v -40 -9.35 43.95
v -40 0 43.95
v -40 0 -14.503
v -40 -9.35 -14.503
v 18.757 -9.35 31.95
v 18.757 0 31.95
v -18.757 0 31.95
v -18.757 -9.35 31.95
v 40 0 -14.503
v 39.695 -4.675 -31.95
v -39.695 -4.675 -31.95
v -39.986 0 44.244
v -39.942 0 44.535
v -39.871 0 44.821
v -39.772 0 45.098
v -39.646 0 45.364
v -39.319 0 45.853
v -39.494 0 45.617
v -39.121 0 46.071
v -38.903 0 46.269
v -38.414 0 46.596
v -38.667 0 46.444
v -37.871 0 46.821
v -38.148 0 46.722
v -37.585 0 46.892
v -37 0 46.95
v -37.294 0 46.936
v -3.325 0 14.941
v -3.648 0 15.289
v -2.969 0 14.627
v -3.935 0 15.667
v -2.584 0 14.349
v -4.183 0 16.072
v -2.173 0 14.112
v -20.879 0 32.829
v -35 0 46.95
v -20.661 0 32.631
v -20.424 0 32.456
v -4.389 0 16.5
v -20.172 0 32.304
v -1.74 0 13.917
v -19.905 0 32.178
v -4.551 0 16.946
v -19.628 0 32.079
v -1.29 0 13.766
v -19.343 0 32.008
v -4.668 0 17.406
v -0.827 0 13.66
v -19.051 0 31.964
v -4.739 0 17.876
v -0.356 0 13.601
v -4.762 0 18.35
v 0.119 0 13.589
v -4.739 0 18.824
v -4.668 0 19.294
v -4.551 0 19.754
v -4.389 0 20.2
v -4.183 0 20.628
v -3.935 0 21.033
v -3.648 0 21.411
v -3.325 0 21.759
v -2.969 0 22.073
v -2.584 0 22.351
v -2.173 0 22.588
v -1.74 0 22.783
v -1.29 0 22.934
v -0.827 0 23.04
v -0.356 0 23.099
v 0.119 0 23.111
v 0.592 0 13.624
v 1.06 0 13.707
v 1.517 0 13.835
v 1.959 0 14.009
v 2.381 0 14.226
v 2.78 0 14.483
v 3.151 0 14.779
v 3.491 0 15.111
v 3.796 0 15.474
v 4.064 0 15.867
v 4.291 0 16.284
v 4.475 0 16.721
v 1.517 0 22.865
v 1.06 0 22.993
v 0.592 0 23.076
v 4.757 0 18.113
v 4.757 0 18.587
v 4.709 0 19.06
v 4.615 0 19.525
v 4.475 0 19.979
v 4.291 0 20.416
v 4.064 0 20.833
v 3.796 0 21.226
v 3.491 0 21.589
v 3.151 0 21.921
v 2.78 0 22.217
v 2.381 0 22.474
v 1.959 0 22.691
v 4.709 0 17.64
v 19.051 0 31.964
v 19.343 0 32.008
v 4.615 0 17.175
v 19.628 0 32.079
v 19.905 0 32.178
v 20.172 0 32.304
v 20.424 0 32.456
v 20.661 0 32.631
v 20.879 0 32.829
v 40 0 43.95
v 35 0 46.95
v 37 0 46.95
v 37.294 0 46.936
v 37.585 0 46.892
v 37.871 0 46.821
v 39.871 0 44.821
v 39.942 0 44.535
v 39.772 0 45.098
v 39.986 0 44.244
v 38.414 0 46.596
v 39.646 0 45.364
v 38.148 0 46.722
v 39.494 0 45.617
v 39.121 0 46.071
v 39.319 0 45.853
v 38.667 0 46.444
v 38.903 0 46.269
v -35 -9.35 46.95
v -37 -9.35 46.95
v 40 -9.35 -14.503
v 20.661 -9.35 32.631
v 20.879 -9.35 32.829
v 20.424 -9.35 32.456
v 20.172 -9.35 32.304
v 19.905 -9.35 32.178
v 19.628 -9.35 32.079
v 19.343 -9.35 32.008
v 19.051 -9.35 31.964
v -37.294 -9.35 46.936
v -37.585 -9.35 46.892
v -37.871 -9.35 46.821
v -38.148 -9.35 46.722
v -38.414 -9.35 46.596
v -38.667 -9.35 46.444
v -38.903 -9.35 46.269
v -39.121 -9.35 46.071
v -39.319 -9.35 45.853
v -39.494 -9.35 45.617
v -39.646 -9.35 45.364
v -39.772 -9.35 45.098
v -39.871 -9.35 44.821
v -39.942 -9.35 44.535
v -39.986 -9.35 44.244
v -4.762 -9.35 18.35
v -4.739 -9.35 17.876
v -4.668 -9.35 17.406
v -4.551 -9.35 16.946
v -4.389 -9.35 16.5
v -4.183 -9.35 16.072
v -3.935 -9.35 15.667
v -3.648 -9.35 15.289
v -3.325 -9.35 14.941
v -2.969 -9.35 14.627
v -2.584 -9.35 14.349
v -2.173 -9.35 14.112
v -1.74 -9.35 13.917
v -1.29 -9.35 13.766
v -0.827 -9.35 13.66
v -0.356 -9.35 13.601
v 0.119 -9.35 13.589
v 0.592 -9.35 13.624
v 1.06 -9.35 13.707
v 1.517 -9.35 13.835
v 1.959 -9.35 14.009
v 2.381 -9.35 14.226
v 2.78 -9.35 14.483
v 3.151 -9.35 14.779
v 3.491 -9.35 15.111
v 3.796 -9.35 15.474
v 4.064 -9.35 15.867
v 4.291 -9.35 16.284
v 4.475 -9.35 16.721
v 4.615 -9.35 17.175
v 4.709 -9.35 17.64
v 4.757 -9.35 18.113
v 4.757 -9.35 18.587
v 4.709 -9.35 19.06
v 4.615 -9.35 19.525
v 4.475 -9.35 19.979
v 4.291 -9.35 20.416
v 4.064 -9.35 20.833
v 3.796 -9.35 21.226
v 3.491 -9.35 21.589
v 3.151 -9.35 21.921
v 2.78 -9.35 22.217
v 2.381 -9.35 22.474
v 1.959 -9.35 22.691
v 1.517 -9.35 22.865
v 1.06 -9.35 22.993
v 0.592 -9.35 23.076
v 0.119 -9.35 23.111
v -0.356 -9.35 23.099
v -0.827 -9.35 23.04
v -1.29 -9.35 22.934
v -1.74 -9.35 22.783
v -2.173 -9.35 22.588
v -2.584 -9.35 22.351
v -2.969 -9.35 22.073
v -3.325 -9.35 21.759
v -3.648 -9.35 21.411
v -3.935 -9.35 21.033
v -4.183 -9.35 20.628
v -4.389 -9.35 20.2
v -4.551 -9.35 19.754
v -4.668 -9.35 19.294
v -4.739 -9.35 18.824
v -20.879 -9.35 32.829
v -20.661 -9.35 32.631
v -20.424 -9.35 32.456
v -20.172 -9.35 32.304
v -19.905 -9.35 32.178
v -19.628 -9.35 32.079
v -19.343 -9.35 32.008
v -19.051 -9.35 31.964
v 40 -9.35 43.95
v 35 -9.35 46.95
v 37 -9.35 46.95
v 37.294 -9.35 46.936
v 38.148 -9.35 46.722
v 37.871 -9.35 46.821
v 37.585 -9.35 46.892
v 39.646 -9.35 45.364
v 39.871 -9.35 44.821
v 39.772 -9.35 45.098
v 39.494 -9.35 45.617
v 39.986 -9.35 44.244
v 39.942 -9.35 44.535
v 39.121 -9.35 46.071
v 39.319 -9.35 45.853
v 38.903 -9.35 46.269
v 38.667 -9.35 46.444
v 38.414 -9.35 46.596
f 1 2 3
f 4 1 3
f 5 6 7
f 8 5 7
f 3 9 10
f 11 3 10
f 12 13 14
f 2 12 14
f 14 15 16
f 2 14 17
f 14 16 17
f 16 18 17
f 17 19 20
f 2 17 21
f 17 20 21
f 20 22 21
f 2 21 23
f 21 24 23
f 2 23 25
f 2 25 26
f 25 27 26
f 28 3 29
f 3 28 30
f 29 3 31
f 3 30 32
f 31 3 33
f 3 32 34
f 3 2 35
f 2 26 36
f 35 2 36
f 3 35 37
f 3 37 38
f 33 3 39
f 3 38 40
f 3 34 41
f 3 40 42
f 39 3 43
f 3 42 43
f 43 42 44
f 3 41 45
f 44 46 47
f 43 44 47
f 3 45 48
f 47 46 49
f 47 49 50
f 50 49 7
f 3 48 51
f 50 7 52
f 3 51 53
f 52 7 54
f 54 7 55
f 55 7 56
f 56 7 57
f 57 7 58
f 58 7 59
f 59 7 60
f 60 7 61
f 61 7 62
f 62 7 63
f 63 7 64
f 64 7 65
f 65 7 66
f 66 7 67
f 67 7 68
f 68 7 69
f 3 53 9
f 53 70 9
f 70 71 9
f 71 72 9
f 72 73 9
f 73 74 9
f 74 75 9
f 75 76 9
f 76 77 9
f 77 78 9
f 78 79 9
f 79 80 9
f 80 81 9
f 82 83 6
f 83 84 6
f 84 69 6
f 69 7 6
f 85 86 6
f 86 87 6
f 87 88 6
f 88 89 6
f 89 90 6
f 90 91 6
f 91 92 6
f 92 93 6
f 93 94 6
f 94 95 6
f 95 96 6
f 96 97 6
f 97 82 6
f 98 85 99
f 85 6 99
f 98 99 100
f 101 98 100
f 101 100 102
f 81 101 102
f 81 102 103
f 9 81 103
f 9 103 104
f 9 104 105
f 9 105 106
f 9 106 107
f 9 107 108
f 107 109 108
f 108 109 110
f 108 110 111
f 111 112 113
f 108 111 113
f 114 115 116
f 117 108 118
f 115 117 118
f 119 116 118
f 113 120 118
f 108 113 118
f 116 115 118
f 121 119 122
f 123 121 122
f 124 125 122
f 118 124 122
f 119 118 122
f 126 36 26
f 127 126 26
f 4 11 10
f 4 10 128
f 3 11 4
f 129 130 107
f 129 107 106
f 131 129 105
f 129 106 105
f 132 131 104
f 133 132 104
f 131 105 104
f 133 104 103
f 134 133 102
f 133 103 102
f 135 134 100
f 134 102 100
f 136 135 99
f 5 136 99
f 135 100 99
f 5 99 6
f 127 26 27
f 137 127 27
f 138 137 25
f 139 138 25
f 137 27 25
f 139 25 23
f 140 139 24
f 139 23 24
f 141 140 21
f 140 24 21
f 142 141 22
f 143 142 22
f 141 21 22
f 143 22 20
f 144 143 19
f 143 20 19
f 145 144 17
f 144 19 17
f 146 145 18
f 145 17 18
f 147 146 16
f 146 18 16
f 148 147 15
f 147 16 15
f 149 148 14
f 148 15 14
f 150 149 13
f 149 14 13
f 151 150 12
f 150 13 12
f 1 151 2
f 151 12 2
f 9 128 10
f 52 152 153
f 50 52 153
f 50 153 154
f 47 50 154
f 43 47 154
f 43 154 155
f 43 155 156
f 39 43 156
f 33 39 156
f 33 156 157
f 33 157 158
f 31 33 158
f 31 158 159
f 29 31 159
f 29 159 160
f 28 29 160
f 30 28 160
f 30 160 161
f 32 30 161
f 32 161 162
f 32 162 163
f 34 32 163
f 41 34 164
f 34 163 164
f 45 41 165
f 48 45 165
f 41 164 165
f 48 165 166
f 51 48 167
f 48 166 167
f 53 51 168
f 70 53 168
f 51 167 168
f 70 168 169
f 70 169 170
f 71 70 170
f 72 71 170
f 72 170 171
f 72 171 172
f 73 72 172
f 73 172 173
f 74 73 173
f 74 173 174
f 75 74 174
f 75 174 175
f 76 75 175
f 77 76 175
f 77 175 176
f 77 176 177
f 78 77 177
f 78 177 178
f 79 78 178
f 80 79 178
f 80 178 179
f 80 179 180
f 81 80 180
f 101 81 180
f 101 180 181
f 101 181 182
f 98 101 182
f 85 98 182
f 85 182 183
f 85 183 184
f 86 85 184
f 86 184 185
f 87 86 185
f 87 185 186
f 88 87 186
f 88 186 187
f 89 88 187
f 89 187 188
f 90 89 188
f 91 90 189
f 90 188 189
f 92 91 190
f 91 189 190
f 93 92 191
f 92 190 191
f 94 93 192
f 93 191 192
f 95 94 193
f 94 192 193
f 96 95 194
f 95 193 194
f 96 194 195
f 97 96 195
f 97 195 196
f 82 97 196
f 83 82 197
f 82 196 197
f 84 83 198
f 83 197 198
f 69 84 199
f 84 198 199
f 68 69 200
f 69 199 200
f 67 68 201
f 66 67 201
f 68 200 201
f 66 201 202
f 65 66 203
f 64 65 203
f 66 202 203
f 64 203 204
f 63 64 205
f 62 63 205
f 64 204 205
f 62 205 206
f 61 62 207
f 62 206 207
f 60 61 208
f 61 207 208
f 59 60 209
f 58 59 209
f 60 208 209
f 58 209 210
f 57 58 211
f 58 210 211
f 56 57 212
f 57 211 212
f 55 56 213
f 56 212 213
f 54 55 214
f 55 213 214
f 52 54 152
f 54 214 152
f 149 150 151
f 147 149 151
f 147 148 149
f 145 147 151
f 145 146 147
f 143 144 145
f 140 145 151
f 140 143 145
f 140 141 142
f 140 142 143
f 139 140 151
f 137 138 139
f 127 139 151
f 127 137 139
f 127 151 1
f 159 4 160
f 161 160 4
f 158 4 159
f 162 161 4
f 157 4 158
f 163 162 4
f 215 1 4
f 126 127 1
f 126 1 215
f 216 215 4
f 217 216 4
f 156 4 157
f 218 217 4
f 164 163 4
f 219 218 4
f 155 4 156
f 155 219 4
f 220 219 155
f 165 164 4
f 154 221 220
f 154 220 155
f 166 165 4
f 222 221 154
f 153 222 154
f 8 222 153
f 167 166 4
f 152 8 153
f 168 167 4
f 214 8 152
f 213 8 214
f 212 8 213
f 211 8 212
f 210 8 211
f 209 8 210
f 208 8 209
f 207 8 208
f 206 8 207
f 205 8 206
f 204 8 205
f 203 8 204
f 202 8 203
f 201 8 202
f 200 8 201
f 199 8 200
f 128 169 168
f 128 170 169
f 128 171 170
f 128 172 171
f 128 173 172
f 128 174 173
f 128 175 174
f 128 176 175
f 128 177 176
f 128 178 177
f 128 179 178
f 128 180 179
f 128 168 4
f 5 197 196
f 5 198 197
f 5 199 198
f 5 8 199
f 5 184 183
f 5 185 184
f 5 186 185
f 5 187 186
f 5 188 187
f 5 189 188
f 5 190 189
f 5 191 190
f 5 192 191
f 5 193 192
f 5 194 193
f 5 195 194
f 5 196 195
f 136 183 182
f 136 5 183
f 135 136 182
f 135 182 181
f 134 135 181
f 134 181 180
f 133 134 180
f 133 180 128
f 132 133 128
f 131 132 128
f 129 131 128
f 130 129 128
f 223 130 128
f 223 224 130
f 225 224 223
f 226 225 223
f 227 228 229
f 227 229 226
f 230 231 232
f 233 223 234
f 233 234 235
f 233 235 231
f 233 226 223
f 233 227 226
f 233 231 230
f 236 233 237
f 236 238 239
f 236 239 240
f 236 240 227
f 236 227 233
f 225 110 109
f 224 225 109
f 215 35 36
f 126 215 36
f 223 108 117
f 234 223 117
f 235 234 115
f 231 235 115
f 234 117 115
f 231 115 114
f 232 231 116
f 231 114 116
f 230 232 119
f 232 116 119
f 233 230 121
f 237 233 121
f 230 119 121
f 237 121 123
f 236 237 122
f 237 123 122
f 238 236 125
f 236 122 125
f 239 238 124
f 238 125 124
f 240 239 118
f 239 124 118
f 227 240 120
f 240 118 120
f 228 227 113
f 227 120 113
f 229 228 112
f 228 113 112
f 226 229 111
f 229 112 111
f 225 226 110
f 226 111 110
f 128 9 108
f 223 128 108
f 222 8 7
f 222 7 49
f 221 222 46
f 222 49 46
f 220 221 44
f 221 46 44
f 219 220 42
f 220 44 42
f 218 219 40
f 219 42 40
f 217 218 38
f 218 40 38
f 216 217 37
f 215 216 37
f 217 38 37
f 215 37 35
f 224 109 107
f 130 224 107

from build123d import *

# Parameters (mm, degrees)
F1_DEPTH = 9.35
F3_DEPTH = 80.001
F5_DEPTH = 9.351
F6_D     = 9.525


with BuildPart() as f1:
    # F0 (on Front) → F1 (new body)
    with BuildSketch(Plane.XZ):
        with BuildLine():
            Line((-40, -31.95), (40, -31.95))
            Line((40, -31.95), (40, 31.95))
            Line((40, 31.95), (40, 43.95))
            ThreePointArc((40, 43.95), (39.1213203436, 46.0713203436), (37, 46.95))
            Line((37, 46.95), (35, 46.95))
            Line((35, 46.95), (20.8786796564, 32.8286796564))
            ThreePointArc((20.8786796564, 32.8286796564), (19.90540961, 32.1783614025), (18.7573593129, 31.95))
            Line((18.7573593129, 31.95), (-18.7573593129, 31.95))
            ThreePointArc((-18.7573593129, 31.95), (-19.90540961, 32.1783614025), (-20.8786796564, 32.8286796564))
            Line((-20.8786796564, 32.8286796564), (-35, 46.95))
            Line((-35, 46.95), (-37, 46.95))
            ThreePointArc((-37, 46.95), (-39.1213203436, 46.0713203436), (-40, 43.95))
            Line((-40, 43.95), (-40, 31.95))
            Line((-40, 31.95), (-40, -31.95))
        make_face()
    extrude(amount=F1_DEPTH)

    # F2 (on face) → F3 (cut, through all)
    with BuildSketch(Plane.YZ.offset(40)):
        Polygon((0.6493095733, -12.0794061572), (-4.675, -31.95), (-9.9993095733, -12.0794061572), (-14.2520674504, -12.0794061572), (-14.2520674504, -36.8148345501), (6.057018973, -36.8148345501), (6.057018973, -12.0794061572), align=None)
    extrude(amount=-F3_DEPTH, mode=Mode.SUBTRACT)

    # F4 (on face) → F5 (cut, through all)
    with BuildSketch(Plane.XZ.offset(9.35)):
        Polygon((-39.5772941897, -38.7194621272), (-40, -14.5026624746), (-52.0872474203, -14.5026624746), (-52.0872474203, -38.7194621272), align=None)
        Polygon((48.822511771, -14.5026624746), (40, -14.5026624746), (39.5603374031, -39.6909157795), (48.822511771, -39.6909157795), align=None)
    extrude(amount=-F5_DEPTH, mode=Mode.SUBTRACT)

    # F6 (through all)
    with Locations(Plane(origin=(0, 0, 0), x_dir=(1, 0, 0), z_dir=(0, 1, 0))):
        with Locations((0, -18.35)):
            Hole(F6_D / 2)


solid = f1.part
